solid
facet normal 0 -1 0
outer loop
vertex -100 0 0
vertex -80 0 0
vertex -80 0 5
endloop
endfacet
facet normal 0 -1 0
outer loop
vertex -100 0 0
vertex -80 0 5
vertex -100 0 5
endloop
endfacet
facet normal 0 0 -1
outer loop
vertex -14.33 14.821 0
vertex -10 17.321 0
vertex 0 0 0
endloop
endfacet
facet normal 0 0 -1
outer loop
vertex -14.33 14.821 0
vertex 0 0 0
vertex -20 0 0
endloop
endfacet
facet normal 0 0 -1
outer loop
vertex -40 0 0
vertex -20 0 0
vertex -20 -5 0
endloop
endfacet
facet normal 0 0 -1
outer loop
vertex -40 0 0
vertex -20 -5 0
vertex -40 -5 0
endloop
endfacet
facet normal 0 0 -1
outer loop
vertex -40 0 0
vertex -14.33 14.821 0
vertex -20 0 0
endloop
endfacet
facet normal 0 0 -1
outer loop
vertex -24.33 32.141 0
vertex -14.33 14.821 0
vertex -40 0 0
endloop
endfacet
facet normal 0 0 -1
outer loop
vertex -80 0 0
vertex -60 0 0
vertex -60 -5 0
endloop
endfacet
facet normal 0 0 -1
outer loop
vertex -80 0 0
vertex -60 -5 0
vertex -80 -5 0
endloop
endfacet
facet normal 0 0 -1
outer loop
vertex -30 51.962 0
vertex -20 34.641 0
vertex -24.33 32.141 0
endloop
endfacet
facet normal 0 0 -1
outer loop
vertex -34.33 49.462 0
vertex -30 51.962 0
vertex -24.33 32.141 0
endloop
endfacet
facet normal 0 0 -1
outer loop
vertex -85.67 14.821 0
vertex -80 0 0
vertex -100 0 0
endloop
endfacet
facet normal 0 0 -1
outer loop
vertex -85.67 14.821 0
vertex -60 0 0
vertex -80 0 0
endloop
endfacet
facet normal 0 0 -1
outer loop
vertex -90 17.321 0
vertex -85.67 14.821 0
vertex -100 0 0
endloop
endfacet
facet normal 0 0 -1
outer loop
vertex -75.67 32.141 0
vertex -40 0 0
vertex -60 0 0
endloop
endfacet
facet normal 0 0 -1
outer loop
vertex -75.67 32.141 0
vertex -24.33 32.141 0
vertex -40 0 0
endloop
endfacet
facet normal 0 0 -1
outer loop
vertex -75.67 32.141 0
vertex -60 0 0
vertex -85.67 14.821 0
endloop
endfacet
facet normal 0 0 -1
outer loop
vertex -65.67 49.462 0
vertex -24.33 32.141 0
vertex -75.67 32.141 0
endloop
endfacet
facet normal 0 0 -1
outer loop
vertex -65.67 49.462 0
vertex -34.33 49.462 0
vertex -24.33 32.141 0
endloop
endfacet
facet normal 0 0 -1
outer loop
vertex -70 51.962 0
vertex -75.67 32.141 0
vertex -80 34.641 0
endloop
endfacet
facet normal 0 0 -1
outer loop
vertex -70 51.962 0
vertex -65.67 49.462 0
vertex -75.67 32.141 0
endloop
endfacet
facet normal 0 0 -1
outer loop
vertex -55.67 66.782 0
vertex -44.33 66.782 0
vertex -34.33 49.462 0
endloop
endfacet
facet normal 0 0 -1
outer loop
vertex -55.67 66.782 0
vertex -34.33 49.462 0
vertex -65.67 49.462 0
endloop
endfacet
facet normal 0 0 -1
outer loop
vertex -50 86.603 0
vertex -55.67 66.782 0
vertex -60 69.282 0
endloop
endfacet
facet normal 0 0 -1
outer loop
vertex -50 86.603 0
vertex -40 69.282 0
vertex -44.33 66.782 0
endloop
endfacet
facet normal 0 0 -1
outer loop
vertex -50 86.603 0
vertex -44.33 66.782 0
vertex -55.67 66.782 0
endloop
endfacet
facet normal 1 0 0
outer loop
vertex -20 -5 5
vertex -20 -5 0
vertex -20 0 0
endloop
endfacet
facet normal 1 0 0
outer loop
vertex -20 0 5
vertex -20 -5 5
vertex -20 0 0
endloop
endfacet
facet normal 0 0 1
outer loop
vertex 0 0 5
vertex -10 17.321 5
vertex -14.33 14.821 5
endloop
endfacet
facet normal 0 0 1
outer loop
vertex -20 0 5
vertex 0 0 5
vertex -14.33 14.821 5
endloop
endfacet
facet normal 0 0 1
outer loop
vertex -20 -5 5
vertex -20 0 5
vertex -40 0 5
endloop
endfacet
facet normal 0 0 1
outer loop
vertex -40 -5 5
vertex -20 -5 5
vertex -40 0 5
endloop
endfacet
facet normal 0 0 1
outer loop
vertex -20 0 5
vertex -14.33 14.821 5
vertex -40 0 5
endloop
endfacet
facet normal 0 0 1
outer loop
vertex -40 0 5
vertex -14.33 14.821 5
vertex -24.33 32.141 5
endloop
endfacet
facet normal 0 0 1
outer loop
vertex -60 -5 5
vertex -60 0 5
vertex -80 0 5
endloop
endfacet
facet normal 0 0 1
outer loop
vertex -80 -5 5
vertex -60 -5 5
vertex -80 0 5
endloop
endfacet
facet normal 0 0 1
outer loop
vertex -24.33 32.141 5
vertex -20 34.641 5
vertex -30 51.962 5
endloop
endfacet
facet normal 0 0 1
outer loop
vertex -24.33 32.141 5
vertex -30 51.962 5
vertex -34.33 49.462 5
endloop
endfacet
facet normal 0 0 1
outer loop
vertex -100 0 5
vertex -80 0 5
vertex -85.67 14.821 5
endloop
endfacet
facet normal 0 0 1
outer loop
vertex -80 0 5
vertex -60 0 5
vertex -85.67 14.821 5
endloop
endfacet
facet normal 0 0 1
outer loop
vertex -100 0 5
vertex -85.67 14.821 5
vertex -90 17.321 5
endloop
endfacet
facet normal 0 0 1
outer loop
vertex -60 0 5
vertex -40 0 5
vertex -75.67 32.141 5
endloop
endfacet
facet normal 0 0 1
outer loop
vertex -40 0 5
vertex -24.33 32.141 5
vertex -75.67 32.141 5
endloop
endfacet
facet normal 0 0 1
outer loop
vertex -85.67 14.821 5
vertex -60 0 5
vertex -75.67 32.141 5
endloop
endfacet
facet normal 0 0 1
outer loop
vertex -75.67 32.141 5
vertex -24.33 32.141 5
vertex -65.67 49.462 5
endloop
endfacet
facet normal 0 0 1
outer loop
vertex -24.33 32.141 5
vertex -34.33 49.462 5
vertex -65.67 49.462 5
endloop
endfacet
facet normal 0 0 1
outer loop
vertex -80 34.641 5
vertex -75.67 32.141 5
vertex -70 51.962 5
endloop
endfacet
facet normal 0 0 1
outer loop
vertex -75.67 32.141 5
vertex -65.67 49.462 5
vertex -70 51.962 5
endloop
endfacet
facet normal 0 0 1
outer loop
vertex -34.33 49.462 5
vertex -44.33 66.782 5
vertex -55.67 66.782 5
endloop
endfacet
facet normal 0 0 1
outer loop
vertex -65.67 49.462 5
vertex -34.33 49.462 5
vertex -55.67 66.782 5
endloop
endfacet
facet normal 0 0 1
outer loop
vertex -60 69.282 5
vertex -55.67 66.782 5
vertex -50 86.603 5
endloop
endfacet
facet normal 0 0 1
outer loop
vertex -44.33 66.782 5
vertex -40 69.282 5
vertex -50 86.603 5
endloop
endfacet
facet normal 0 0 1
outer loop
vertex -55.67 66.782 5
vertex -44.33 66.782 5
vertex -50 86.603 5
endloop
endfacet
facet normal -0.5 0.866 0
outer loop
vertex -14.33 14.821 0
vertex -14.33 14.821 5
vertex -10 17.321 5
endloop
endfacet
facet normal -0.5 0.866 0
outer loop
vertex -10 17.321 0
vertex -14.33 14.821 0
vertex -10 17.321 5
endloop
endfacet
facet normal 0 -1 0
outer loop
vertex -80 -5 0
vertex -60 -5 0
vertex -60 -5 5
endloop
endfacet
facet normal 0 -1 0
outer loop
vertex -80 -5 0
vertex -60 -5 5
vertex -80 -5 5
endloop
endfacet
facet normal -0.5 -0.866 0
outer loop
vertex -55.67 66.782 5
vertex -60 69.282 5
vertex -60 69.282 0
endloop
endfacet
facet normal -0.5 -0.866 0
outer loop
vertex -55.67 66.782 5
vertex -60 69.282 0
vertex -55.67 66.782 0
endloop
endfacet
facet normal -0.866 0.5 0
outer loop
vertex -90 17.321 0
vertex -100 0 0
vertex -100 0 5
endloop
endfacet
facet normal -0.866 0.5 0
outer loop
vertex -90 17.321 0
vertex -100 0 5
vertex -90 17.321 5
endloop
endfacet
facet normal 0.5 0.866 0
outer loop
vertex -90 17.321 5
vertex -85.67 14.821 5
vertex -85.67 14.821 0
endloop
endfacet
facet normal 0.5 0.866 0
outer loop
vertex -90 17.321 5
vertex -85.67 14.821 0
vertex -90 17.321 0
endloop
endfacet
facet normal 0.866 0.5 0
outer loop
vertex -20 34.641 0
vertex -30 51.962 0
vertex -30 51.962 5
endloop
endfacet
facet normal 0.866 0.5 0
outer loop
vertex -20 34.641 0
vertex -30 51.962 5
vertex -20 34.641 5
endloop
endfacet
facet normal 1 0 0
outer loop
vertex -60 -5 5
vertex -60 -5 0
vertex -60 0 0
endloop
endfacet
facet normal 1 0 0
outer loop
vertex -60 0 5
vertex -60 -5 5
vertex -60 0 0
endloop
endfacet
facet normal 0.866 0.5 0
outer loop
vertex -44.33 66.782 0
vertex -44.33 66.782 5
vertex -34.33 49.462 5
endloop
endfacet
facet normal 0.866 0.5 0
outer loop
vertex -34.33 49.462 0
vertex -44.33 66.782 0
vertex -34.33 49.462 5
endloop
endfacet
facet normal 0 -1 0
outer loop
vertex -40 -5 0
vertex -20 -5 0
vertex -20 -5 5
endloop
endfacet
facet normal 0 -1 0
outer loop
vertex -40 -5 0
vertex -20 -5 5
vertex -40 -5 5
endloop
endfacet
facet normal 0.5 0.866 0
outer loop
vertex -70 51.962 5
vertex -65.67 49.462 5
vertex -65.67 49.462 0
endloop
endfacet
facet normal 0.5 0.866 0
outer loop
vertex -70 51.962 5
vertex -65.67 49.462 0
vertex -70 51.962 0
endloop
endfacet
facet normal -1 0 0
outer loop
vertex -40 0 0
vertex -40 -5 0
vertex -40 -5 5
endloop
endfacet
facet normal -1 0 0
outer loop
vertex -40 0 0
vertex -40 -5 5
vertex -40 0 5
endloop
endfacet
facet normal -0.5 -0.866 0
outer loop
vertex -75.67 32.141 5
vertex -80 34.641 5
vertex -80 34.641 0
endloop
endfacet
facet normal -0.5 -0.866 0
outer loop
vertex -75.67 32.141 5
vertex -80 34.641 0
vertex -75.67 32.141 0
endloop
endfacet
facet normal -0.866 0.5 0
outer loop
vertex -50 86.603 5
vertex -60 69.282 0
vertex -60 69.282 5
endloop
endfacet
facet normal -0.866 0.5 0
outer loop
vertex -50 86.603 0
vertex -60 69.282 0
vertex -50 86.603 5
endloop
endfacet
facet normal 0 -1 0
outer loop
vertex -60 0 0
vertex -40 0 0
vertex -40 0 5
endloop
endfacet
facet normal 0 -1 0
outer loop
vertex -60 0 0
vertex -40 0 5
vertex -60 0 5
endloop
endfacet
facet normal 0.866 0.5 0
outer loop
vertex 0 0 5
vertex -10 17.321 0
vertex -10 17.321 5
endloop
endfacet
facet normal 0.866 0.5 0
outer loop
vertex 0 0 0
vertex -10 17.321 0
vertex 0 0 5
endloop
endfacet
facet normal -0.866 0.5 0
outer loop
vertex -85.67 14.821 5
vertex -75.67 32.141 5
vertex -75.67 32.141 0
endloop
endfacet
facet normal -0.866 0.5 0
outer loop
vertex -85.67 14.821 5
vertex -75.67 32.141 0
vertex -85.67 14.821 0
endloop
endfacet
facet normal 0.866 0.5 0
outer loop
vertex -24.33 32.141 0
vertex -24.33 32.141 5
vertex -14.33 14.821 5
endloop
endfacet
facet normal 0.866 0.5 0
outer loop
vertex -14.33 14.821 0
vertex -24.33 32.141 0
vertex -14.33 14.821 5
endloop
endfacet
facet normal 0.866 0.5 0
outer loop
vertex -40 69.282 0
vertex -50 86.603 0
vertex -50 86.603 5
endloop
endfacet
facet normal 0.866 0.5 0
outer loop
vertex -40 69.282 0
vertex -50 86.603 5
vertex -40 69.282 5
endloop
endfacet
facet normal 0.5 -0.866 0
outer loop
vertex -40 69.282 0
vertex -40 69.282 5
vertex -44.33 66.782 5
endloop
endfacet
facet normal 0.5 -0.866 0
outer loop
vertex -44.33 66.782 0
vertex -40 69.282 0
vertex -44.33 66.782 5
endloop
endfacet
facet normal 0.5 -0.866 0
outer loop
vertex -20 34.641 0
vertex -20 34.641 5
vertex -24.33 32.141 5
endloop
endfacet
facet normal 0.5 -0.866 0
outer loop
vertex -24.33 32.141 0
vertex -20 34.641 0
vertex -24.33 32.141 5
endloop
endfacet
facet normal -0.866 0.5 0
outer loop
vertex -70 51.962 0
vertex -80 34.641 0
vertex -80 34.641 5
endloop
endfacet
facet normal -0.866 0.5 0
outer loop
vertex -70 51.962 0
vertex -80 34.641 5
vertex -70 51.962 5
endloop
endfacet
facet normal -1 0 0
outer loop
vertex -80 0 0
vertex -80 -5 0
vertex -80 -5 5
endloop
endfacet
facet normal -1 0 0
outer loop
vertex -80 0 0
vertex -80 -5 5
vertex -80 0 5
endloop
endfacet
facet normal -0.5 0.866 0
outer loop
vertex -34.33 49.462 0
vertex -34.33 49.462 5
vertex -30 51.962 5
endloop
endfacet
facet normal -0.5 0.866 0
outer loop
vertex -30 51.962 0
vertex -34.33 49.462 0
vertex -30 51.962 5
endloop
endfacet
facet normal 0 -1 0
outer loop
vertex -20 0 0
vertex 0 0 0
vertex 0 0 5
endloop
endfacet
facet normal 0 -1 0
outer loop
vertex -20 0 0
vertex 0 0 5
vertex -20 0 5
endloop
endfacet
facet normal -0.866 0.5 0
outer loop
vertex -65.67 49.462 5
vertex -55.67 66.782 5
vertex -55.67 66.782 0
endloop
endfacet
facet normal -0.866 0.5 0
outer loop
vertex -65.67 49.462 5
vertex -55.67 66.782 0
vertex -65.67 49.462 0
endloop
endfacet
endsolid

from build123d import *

# Parameters (mm, degrees)
BOSS_EXTRU_1_DEPTH      = 5
ESQUISSE2_W             = 20
ESQUISSE2_H             = 5
BOSS_EXTRU_2_DEPTH      = 5
ENL_V_MAT_EXTRU_1_DEPTH = 133.382022949


with BuildPart() as part:
    # Esquisse1 → Boss.-Extru.1 (new body)
    with BuildSketch(Plane.XY):
        Polygon((0, 0), (-100, 0), (-50, 86.602540378), align=None)
    extrude(amount=BOSS_EXTRU_1_DEPTH)

    # Esquisse2 → Boss.-Extru.2 (add)
    with BuildSketch(Plane(origin=(0, 0, 0), x_dir=(-1, 0, 0), z_dir=(0, 0, -1))):
        with Locations((30, -2.5)):
            Rectangle(ESQUISSE2_W, ESQUISSE2_H)
        with Locations((70, -2.5)):
            Rectangle(ESQUISSE2_W, ESQUISSE2_H)
    extrude(amount=-BOSS_EXTRU_2_DEPTH)

    # Esquisse3 → Enlèv. mat.-Extru.1 (cut, through all)
    with BuildSketch(Plane.XY.offset(5)):
        Polygon((-60, 69.282032303), (-55.669872981, 66.782032303), (-65.669872981, 49.461524227), (-70, 51.961524227), align=None)
        Polygon((-80, 34.641016151), (-75.669872981, 32.141016151), (-85.669872981, 14.820508076), (-90, 17.320508076), align=None)
        Polygon((-10, 17.320508076), (-20, 34.641016151), (-24.330127019, 32.141016151), (-14.330127019, 14.820508076), align=None)
        Polygon((-30, 51.961524227), (-40, 69.282032303), (-44.330127019, 66.782032303), (-34.330127019, 49.461524227), align=None)
    extrude(amount=-ENL_V_MAT_EXTRU_1_DEPTH, mode=Mode.SUBTRACT)


solid = part.part
